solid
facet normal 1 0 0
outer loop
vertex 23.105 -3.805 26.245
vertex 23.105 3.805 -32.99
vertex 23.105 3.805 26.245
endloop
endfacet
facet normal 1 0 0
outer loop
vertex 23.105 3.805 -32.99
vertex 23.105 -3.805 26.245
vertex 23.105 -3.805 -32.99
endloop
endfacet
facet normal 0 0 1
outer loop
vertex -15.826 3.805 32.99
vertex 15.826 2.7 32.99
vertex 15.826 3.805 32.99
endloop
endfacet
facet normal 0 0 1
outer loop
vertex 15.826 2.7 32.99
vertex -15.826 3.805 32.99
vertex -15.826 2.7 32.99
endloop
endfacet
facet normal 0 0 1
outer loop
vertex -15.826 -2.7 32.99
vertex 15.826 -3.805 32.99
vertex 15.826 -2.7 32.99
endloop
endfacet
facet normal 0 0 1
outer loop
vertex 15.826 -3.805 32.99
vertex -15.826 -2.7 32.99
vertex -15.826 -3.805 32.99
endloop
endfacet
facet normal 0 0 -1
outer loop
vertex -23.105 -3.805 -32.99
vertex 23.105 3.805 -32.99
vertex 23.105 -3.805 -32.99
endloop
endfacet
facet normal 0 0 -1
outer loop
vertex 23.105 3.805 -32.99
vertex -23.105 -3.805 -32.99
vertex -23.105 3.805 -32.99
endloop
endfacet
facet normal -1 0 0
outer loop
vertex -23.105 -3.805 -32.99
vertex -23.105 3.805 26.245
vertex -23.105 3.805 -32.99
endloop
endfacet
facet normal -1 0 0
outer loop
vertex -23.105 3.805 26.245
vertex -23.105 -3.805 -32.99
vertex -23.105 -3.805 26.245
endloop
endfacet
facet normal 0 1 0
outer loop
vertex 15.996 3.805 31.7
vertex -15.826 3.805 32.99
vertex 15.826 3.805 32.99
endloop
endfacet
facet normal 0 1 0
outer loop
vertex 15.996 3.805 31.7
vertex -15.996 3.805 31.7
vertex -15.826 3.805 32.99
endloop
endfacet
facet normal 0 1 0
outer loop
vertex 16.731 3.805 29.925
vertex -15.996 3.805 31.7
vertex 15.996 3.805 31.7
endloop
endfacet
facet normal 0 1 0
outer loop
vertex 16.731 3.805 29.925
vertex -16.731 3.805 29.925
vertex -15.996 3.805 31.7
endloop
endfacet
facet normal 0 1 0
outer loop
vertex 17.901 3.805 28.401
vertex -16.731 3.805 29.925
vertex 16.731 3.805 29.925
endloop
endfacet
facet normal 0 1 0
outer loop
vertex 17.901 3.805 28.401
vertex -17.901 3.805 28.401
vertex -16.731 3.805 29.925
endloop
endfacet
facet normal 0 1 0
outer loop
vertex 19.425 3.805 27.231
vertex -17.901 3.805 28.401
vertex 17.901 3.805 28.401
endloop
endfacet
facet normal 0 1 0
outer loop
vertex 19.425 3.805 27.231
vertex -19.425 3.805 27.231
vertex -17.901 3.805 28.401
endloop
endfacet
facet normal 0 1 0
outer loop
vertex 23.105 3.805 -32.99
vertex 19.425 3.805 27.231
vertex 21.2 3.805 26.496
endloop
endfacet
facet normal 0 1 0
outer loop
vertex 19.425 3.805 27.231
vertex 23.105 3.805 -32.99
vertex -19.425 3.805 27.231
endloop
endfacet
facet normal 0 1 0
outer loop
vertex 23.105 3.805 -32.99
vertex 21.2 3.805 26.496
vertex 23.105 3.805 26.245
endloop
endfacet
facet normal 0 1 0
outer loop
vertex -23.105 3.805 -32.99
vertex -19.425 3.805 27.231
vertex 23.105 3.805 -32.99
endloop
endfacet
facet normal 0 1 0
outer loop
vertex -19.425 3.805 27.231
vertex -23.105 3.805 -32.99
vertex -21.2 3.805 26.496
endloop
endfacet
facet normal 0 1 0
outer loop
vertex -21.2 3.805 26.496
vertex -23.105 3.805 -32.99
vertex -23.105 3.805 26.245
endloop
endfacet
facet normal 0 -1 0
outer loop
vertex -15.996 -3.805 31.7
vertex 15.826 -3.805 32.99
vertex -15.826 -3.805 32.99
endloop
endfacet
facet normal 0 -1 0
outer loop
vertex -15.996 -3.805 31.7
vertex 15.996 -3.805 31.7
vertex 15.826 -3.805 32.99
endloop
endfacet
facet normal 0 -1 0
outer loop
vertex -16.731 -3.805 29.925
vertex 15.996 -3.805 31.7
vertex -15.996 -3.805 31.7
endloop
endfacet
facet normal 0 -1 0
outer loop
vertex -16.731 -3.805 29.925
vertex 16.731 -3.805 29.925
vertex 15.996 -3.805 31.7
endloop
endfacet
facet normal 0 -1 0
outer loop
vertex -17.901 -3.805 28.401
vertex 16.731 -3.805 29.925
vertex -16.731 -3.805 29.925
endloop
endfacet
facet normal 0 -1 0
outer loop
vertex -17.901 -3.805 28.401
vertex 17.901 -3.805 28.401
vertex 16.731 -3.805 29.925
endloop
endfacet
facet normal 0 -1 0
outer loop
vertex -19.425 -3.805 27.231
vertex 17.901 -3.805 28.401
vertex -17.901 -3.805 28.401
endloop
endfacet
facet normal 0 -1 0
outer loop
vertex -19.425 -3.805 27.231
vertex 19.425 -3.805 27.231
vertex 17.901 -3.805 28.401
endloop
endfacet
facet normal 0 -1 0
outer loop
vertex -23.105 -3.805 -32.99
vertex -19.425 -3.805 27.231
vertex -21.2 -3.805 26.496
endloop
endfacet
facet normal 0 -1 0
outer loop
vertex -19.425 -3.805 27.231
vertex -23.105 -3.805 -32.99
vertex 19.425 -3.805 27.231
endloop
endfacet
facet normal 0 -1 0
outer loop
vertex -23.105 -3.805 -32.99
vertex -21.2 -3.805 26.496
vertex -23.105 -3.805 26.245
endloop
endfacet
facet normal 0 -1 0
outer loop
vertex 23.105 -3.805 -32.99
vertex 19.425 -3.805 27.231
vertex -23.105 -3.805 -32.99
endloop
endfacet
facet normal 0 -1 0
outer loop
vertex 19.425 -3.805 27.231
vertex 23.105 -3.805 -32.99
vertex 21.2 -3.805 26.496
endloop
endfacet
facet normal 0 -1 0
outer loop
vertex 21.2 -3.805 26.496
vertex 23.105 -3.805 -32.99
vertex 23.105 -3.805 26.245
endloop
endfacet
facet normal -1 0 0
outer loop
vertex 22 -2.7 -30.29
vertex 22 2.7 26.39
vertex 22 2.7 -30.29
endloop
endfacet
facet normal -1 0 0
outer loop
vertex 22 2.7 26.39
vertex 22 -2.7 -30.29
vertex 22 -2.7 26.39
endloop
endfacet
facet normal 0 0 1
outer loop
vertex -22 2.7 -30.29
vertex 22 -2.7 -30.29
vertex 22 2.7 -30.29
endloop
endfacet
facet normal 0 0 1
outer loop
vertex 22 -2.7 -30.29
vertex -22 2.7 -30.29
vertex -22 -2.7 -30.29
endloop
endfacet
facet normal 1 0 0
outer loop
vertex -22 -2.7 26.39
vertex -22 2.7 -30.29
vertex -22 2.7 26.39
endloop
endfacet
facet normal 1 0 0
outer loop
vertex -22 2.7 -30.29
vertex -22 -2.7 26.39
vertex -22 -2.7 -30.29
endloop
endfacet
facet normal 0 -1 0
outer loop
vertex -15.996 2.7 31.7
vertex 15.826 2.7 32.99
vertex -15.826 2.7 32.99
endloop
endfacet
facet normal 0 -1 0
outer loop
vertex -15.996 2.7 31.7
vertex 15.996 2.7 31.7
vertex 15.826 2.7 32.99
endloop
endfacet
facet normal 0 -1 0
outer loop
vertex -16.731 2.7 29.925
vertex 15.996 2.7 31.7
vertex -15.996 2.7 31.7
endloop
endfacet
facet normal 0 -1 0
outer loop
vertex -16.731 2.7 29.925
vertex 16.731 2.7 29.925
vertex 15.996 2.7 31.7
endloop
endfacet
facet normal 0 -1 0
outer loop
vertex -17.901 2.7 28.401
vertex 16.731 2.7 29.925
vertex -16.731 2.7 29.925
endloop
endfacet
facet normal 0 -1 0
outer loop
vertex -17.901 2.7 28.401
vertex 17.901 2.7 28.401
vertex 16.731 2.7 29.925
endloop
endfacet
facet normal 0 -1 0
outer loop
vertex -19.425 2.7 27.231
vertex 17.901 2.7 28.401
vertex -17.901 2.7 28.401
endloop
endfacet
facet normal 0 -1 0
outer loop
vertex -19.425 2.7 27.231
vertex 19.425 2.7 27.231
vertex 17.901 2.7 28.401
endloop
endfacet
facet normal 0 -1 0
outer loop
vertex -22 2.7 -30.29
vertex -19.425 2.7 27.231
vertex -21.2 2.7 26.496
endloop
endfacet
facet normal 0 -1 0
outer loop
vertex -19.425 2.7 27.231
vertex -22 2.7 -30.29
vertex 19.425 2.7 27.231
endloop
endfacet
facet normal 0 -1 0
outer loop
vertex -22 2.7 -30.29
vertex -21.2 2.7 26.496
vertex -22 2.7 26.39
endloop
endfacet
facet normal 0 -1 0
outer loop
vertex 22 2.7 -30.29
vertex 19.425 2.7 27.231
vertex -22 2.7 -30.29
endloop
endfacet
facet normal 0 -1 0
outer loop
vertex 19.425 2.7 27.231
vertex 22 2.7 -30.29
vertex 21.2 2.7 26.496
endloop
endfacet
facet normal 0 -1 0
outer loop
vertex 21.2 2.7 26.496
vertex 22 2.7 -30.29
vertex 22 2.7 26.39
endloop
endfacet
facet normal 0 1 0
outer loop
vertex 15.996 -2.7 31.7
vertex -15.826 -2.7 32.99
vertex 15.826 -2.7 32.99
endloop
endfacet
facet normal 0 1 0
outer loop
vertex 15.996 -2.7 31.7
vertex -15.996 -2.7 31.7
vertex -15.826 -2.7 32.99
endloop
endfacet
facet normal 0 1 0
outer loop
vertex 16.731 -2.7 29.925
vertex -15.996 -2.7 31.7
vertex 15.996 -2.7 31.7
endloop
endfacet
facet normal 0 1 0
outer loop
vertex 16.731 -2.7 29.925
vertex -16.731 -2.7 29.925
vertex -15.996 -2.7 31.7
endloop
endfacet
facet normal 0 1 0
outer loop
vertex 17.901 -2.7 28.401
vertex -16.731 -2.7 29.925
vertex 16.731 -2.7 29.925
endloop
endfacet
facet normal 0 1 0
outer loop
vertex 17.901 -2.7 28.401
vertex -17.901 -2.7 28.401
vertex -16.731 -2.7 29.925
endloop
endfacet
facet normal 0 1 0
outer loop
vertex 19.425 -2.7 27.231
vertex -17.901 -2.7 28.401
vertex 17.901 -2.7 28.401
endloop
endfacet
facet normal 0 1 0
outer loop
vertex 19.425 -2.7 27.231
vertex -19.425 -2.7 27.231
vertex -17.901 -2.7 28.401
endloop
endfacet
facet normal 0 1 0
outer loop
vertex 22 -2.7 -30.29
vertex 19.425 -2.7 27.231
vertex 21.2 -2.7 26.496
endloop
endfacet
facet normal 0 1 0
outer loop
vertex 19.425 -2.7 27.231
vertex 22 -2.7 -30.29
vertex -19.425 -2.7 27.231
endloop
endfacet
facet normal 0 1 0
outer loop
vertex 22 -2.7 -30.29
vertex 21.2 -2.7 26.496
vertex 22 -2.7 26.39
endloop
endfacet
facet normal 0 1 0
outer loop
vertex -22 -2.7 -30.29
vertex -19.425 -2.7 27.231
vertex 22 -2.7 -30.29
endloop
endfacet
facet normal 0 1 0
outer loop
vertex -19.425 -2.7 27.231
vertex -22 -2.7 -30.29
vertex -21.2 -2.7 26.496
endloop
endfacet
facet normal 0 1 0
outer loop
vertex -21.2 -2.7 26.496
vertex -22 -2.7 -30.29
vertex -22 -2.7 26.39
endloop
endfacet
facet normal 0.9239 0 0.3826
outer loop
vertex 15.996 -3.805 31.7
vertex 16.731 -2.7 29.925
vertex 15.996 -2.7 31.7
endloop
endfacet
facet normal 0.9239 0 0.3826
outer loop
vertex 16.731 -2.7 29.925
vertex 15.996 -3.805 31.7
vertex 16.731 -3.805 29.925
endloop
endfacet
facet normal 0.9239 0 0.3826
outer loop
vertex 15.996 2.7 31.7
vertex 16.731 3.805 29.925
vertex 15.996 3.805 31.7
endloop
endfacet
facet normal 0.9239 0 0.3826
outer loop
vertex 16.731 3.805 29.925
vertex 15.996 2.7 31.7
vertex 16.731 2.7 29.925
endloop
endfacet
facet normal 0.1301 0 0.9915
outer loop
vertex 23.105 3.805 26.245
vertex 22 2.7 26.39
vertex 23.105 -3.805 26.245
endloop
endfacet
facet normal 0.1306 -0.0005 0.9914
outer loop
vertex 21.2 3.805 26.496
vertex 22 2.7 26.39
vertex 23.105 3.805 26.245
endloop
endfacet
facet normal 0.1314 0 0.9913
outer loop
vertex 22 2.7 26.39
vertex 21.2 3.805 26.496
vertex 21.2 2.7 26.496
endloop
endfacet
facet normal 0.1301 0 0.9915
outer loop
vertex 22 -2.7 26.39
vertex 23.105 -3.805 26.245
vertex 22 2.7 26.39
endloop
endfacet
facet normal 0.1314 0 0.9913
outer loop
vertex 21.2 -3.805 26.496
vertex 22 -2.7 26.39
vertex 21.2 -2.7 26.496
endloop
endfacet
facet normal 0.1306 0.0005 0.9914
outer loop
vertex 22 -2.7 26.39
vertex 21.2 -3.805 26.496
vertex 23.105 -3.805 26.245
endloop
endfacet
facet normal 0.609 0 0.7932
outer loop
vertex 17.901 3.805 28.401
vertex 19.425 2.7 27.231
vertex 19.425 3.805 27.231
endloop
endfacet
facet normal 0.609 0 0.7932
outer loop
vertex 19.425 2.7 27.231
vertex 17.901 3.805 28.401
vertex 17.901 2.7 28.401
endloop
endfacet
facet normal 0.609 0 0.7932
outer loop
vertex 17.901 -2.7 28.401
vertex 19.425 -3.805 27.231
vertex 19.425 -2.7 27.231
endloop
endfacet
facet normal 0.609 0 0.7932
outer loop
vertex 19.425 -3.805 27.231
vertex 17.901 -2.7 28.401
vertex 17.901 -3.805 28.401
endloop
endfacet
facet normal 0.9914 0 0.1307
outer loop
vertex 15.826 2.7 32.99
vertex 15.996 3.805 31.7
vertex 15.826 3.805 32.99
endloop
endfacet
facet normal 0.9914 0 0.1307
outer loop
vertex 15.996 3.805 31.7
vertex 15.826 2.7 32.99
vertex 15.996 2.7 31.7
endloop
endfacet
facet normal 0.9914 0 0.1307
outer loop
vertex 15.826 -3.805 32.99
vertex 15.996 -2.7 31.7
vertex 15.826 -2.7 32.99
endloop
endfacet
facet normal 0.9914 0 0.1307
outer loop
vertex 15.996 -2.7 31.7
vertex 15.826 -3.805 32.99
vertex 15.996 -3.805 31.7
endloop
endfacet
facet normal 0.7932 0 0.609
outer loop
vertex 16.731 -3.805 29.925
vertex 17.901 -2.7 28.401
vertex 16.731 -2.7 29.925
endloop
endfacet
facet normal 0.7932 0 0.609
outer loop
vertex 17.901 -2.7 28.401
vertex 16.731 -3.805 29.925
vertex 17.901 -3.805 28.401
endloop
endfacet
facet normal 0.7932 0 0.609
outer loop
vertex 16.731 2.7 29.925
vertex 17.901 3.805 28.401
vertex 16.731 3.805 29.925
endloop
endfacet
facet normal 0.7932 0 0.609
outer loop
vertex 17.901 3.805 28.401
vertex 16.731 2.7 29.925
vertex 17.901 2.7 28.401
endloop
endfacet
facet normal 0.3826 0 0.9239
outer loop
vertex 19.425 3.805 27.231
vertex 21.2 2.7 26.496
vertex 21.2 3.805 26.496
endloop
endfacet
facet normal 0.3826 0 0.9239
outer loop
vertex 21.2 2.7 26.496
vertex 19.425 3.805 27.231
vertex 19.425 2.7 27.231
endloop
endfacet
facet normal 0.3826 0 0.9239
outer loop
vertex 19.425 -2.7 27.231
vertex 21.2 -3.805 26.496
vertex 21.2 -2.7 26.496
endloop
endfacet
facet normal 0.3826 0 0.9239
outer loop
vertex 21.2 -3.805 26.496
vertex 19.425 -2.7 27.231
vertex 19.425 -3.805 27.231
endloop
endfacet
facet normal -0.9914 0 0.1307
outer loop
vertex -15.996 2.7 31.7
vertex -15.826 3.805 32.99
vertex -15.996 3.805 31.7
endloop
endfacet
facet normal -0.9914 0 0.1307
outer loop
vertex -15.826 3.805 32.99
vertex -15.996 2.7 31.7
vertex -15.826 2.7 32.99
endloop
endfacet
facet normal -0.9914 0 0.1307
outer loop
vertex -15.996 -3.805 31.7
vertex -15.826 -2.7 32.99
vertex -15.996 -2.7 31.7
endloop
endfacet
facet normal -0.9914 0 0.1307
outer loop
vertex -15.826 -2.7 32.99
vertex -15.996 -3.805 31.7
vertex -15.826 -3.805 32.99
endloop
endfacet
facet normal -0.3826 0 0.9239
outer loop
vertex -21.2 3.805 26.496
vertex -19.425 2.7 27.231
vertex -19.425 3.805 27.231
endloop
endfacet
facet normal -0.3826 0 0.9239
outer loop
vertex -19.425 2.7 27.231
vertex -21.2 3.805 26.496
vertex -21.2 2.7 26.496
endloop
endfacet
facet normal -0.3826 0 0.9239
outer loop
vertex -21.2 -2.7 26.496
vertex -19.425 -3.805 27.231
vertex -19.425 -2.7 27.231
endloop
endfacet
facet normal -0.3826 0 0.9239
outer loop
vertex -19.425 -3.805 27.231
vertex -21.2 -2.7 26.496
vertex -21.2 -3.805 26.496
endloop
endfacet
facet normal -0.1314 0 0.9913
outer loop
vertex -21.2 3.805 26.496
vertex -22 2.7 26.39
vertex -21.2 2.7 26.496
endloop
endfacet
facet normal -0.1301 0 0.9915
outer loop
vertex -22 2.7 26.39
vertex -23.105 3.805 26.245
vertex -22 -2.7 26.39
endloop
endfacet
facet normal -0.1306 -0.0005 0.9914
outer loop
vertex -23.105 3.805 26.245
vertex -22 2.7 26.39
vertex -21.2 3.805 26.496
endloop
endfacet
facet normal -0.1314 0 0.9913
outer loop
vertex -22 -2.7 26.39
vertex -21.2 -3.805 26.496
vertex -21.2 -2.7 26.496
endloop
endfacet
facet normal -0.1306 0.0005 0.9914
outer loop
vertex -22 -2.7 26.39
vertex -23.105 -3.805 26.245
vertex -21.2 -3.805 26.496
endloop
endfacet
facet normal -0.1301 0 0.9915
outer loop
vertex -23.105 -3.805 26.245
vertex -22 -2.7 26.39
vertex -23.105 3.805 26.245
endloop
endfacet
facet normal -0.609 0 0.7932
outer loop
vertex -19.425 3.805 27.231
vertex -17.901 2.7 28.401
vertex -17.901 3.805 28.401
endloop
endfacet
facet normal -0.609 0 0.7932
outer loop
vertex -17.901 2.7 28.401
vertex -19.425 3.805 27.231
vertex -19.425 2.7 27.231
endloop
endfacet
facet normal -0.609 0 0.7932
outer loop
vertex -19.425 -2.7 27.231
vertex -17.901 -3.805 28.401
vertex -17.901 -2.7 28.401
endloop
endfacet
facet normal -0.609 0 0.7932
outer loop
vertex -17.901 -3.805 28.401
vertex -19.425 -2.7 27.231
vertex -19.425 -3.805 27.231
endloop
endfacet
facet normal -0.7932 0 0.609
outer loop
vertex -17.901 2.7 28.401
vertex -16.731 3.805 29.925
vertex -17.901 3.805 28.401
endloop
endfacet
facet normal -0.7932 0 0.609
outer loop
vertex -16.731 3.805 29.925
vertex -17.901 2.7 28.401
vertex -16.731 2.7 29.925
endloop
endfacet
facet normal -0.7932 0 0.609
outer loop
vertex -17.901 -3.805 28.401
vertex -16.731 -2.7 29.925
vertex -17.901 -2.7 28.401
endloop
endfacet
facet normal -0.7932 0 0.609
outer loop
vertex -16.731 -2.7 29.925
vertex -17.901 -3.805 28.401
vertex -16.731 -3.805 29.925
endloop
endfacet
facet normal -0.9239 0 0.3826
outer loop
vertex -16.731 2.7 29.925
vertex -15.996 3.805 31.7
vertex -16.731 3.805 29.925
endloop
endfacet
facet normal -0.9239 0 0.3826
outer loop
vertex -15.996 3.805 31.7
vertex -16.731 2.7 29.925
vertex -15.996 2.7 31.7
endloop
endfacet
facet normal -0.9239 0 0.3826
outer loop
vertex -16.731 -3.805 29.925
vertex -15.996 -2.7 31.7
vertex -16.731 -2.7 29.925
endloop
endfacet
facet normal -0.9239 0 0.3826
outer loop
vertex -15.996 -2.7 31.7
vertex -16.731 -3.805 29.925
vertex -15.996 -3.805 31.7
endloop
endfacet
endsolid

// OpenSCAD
/*
Parametric Cell Phone Battery holder. 

Case to hold a spare battery without fear of shorting it out.

Created by Mike Creuzer - Mike@Creuzer.com - 20120816
*/

// Battery dimensions in mm
// Internal height
height = 65;
// Internal Width
width  = 44;
// Internal narrow bit
depth  = 5.4;

// Print Settings in mm
// Looking at the gcode of a sliced file often times tells you this at the top of the file
singleWallWidth = .49; 
// Number of walls you want
thickness          = 2; 
// how much added 'slop' you want so the case is easier to use.
clearence          = .25; 




difference()
{
	cube(size = [width + 2*thickness*singleWallWidth + clearence, depth + 2*thickness*singleWallWidth + clearence, height + thickness*singleWallWidth], center=true);

	translate([0,0,2*thickness*singleWallWidth + clearence]) cube(size = [width,depth, height], center=true);
	translate([.5*(width + 2*thickness*singleWallWidth + clearence),0,.5 * (height + 2*thickness*singleWallWidth + clearence)]) rotate([90,0,0]) cylinder(r = depth + 2*thickness*singleWallWidth, h=depth + 2*thickness*singleWallWidth + clearence, center=true);
	translate([-.5*(width + 2*thickness*singleWallWidth + clearence),0,.5 * (height + 2*thickness*singleWallWidth + clearence)]) rotate([90,0,0]) cylinder(r = depth + 2*thickness*singleWallWidth, h=depth + 2*thickness*singleWallWidth + clearence, center=true);

}
